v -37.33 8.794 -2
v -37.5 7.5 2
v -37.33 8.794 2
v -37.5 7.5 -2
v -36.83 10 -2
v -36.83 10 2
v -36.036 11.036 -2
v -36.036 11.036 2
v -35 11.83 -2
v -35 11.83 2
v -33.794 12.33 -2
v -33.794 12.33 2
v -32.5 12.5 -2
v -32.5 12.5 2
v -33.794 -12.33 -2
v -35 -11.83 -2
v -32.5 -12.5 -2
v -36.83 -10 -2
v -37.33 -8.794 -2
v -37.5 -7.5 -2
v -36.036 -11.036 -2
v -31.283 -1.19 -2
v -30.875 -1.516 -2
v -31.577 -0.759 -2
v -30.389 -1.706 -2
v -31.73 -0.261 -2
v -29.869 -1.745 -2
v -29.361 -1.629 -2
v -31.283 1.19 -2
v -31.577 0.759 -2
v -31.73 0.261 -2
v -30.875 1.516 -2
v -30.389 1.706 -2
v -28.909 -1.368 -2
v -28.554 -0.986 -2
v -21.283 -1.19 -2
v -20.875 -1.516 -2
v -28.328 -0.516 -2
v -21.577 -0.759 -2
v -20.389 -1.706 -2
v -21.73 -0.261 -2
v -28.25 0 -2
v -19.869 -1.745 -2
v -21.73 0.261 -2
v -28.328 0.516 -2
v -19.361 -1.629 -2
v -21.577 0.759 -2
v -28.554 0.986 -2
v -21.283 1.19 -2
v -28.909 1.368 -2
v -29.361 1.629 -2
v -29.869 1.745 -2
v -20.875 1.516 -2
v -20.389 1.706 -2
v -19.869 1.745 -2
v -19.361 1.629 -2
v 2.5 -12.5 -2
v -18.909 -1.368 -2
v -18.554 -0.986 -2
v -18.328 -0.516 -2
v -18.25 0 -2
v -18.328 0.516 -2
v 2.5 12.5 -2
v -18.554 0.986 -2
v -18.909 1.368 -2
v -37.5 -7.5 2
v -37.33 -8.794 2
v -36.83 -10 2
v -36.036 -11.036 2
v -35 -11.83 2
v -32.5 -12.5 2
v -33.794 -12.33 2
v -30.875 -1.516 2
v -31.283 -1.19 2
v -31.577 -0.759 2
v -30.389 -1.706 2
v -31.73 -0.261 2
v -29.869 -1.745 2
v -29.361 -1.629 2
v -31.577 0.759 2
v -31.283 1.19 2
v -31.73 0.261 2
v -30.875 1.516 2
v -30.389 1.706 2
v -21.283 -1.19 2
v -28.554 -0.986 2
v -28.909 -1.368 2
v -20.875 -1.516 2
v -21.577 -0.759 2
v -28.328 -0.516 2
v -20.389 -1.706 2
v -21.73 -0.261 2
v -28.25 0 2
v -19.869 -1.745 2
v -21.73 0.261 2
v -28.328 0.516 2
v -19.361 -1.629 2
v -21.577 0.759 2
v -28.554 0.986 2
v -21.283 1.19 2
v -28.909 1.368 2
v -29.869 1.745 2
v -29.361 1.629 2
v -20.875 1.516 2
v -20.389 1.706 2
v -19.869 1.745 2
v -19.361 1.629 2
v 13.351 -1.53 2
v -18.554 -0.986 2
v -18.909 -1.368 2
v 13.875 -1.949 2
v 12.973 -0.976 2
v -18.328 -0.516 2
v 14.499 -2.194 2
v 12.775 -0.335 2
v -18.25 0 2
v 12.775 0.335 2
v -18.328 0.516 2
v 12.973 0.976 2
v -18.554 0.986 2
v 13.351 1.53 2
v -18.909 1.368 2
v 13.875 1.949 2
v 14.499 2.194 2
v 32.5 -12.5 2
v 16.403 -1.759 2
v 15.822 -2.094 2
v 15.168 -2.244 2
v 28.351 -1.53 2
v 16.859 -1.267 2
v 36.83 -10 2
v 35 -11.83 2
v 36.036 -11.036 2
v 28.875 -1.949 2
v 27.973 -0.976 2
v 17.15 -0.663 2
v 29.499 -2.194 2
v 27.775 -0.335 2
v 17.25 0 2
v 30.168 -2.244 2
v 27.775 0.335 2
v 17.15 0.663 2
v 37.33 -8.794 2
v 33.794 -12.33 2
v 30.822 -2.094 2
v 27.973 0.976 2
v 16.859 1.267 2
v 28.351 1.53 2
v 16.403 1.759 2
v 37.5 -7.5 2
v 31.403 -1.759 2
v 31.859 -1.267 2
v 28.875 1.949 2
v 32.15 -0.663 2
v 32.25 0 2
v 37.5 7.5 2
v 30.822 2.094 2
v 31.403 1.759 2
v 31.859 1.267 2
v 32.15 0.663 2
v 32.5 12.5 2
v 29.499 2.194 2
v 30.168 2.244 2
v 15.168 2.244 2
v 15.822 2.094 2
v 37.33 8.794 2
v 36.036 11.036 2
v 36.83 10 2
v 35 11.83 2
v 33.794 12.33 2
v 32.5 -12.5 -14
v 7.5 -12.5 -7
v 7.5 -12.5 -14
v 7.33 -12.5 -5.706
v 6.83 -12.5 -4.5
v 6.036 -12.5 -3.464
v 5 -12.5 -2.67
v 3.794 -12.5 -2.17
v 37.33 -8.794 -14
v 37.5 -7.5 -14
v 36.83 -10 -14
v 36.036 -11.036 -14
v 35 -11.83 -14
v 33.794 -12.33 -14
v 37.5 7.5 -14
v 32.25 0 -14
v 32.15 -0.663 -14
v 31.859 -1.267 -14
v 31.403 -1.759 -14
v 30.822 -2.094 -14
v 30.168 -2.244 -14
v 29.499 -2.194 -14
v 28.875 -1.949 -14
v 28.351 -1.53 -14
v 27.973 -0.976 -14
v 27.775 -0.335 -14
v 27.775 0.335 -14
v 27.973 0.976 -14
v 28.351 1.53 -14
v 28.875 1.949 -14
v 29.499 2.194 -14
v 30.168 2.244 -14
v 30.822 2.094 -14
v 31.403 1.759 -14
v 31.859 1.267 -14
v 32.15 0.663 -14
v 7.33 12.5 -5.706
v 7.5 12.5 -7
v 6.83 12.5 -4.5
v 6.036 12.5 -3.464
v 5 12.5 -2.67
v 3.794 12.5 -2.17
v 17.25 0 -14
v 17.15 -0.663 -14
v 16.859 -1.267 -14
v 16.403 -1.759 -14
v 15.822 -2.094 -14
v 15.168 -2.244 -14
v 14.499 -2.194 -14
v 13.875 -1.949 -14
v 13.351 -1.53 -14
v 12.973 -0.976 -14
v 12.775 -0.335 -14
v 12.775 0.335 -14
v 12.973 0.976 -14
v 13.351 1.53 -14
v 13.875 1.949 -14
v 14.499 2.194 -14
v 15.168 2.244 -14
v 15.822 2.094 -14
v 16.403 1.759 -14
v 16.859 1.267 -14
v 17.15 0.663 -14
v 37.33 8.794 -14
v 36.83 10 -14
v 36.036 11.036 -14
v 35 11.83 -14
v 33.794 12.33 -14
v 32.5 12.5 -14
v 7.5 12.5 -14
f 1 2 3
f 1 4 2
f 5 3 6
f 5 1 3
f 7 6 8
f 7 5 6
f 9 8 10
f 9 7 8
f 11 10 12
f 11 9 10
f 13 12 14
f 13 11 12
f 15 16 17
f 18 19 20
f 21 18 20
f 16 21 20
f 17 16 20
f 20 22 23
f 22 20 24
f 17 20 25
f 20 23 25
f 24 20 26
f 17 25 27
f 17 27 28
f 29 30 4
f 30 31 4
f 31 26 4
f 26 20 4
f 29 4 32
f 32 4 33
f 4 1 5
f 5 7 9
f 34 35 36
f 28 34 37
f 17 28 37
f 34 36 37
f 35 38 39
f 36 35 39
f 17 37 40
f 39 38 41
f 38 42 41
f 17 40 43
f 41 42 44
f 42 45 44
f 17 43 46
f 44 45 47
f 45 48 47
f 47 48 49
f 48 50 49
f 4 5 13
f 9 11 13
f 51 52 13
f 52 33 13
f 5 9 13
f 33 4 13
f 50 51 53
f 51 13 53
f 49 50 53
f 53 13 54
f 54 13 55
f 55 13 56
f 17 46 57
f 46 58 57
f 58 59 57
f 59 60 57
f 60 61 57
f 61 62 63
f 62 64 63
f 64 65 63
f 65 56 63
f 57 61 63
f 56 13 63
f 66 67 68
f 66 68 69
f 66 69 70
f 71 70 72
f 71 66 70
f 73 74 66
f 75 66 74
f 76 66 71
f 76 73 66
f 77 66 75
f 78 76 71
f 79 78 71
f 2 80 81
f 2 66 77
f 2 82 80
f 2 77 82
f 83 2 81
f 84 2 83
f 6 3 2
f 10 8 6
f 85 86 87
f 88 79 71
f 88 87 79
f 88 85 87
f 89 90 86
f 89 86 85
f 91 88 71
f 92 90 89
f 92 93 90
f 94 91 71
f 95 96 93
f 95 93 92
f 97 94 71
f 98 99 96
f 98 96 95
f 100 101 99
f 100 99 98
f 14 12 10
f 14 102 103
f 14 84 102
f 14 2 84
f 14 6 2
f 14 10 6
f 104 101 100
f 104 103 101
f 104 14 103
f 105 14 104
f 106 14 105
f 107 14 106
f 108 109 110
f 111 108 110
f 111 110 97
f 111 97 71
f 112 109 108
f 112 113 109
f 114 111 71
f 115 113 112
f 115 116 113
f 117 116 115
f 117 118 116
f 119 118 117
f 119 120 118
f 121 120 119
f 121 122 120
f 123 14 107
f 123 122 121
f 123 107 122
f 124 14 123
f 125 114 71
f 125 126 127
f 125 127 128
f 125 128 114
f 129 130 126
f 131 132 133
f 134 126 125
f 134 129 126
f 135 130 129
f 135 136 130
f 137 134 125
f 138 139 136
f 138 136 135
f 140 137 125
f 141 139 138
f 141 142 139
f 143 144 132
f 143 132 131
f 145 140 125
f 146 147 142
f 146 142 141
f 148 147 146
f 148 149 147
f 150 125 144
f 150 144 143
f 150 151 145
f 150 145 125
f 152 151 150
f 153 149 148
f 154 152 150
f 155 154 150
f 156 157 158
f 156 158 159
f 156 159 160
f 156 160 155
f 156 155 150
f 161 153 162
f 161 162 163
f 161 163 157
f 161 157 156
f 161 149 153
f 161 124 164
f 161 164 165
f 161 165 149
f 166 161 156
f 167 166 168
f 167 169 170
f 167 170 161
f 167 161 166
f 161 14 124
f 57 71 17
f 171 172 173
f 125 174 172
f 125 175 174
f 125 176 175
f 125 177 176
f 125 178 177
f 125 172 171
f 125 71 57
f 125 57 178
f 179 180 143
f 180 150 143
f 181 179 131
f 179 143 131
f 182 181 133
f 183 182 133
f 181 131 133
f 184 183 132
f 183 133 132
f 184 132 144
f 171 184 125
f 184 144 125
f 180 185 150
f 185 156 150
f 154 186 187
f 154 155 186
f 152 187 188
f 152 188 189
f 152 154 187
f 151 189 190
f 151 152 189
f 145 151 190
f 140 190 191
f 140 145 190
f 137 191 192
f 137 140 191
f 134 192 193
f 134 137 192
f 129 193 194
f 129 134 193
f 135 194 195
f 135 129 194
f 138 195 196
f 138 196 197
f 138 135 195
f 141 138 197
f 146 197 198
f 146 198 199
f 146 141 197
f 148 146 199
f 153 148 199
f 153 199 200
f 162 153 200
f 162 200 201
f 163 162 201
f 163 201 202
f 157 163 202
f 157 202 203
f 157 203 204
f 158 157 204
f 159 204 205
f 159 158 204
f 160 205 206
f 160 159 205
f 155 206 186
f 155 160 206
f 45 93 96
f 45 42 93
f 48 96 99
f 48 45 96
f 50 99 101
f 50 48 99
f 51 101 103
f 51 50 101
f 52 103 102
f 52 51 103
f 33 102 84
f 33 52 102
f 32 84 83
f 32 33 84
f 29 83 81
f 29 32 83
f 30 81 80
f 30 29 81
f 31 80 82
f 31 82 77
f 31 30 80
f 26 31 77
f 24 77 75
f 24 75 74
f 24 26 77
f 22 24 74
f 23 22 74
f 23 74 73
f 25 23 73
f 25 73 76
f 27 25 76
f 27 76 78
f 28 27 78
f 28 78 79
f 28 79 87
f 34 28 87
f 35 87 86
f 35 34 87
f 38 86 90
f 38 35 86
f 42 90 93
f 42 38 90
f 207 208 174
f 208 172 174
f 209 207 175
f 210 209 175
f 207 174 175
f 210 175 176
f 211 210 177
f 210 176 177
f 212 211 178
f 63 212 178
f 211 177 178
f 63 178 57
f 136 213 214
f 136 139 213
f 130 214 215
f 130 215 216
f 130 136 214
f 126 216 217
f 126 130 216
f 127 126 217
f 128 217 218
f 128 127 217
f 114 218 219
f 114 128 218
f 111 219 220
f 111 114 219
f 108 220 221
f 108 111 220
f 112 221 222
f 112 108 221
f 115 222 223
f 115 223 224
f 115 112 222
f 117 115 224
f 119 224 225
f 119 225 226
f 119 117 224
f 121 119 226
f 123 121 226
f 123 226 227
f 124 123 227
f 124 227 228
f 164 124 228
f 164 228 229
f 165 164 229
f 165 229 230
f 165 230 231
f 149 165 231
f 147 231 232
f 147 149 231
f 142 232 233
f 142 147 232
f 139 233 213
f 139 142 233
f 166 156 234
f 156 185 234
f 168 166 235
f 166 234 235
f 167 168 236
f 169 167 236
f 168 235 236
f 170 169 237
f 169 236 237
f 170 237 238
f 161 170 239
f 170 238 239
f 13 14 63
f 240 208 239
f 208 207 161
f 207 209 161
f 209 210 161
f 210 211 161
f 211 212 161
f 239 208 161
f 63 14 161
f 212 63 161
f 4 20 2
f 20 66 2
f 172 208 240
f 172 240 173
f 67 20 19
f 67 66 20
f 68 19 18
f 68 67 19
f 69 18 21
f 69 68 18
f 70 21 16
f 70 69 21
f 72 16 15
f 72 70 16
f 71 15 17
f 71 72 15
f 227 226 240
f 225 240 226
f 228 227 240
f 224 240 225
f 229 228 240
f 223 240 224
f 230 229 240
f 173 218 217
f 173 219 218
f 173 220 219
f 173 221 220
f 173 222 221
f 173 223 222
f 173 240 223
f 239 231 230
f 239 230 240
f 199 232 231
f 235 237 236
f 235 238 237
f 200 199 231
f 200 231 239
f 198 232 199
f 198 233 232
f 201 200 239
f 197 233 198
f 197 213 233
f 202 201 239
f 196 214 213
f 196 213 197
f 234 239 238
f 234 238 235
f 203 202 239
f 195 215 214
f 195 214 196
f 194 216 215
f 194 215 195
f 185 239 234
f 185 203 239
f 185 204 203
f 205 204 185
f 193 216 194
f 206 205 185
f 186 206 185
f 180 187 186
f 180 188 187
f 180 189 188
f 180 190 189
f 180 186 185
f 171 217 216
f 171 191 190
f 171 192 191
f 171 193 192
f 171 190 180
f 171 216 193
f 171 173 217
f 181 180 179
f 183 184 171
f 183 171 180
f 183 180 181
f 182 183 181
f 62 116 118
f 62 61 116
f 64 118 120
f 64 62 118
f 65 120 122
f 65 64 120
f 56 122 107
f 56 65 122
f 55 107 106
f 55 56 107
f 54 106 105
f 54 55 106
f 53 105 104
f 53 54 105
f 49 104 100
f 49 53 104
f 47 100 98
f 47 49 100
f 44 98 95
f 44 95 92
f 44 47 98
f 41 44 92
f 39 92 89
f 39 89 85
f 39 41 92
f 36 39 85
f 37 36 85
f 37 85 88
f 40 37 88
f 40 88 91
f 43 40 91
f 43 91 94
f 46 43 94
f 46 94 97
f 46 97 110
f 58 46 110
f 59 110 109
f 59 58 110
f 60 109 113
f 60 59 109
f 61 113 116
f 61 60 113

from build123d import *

# Parameters (mm, degrees)
F0_W     = 75
F0_H     = 25
F0_R     = 1.75
F1_DEPTH = 2
F2_W     = 30
F2_H     = 25
F2_R     = 2.25
F3_DEPTH = 12
F4_DEPTH = 4
F5_R     = 5


with BuildPart() as f1:
    # F0 (on Top) → F1 (new body, symmetric)
    with BuildSketch(Plane.XY):
        Rectangle(F0_W, F0_H)
        with Locations((-30, 0)):
            Circle(F0_R, mode=Mode.SUBTRACT)
        with Locations((-20, 0)):
            Circle(F0_R, mode=Mode.SUBTRACT)
    extrude(amount=F1_DEPTH, both=True)

    # F2 (on face) → F3 (join)
    with BuildSketch(Plane(origin=(0, 0, -2), x_dir=(1, 0, 0), z_dir=(0, 0, -1))):
        with Locations((22.5, 0)):
            Rectangle(F2_W, F2_H)
        with Locations((15, 0)):
            Circle(F2_R, mode=Mode.SUBTRACT)
        with Locations((30, 0)):
            Circle(F2_R, mode=Mode.SUBTRACT)
    extrude(amount=F3_DEPTH)

    # F4 (cut, through all): faces of the model
    f4_faces = [f1.faces().sort_by_distance(p)[0] for p in [
        (15, 0, -2),
        (30, 0, -2),
    ]]
    extrude(f4_faces, amount=-F4_DEPTH, mode=Mode.SUBTRACT)

    # F5
    f5_edges = [f1.edges().sort_by_distance(p)[0] for p in [
        (-37.5, 12.5, 0),
        (-37.5, -12.5, 0),
        (7.5, 0, -2),
        (37.5, -12.5, -6),
        (37.5, 12.5, -6),
    ]]
    fillet(f5_edges, radius=F5_R)


solid = f1.part
